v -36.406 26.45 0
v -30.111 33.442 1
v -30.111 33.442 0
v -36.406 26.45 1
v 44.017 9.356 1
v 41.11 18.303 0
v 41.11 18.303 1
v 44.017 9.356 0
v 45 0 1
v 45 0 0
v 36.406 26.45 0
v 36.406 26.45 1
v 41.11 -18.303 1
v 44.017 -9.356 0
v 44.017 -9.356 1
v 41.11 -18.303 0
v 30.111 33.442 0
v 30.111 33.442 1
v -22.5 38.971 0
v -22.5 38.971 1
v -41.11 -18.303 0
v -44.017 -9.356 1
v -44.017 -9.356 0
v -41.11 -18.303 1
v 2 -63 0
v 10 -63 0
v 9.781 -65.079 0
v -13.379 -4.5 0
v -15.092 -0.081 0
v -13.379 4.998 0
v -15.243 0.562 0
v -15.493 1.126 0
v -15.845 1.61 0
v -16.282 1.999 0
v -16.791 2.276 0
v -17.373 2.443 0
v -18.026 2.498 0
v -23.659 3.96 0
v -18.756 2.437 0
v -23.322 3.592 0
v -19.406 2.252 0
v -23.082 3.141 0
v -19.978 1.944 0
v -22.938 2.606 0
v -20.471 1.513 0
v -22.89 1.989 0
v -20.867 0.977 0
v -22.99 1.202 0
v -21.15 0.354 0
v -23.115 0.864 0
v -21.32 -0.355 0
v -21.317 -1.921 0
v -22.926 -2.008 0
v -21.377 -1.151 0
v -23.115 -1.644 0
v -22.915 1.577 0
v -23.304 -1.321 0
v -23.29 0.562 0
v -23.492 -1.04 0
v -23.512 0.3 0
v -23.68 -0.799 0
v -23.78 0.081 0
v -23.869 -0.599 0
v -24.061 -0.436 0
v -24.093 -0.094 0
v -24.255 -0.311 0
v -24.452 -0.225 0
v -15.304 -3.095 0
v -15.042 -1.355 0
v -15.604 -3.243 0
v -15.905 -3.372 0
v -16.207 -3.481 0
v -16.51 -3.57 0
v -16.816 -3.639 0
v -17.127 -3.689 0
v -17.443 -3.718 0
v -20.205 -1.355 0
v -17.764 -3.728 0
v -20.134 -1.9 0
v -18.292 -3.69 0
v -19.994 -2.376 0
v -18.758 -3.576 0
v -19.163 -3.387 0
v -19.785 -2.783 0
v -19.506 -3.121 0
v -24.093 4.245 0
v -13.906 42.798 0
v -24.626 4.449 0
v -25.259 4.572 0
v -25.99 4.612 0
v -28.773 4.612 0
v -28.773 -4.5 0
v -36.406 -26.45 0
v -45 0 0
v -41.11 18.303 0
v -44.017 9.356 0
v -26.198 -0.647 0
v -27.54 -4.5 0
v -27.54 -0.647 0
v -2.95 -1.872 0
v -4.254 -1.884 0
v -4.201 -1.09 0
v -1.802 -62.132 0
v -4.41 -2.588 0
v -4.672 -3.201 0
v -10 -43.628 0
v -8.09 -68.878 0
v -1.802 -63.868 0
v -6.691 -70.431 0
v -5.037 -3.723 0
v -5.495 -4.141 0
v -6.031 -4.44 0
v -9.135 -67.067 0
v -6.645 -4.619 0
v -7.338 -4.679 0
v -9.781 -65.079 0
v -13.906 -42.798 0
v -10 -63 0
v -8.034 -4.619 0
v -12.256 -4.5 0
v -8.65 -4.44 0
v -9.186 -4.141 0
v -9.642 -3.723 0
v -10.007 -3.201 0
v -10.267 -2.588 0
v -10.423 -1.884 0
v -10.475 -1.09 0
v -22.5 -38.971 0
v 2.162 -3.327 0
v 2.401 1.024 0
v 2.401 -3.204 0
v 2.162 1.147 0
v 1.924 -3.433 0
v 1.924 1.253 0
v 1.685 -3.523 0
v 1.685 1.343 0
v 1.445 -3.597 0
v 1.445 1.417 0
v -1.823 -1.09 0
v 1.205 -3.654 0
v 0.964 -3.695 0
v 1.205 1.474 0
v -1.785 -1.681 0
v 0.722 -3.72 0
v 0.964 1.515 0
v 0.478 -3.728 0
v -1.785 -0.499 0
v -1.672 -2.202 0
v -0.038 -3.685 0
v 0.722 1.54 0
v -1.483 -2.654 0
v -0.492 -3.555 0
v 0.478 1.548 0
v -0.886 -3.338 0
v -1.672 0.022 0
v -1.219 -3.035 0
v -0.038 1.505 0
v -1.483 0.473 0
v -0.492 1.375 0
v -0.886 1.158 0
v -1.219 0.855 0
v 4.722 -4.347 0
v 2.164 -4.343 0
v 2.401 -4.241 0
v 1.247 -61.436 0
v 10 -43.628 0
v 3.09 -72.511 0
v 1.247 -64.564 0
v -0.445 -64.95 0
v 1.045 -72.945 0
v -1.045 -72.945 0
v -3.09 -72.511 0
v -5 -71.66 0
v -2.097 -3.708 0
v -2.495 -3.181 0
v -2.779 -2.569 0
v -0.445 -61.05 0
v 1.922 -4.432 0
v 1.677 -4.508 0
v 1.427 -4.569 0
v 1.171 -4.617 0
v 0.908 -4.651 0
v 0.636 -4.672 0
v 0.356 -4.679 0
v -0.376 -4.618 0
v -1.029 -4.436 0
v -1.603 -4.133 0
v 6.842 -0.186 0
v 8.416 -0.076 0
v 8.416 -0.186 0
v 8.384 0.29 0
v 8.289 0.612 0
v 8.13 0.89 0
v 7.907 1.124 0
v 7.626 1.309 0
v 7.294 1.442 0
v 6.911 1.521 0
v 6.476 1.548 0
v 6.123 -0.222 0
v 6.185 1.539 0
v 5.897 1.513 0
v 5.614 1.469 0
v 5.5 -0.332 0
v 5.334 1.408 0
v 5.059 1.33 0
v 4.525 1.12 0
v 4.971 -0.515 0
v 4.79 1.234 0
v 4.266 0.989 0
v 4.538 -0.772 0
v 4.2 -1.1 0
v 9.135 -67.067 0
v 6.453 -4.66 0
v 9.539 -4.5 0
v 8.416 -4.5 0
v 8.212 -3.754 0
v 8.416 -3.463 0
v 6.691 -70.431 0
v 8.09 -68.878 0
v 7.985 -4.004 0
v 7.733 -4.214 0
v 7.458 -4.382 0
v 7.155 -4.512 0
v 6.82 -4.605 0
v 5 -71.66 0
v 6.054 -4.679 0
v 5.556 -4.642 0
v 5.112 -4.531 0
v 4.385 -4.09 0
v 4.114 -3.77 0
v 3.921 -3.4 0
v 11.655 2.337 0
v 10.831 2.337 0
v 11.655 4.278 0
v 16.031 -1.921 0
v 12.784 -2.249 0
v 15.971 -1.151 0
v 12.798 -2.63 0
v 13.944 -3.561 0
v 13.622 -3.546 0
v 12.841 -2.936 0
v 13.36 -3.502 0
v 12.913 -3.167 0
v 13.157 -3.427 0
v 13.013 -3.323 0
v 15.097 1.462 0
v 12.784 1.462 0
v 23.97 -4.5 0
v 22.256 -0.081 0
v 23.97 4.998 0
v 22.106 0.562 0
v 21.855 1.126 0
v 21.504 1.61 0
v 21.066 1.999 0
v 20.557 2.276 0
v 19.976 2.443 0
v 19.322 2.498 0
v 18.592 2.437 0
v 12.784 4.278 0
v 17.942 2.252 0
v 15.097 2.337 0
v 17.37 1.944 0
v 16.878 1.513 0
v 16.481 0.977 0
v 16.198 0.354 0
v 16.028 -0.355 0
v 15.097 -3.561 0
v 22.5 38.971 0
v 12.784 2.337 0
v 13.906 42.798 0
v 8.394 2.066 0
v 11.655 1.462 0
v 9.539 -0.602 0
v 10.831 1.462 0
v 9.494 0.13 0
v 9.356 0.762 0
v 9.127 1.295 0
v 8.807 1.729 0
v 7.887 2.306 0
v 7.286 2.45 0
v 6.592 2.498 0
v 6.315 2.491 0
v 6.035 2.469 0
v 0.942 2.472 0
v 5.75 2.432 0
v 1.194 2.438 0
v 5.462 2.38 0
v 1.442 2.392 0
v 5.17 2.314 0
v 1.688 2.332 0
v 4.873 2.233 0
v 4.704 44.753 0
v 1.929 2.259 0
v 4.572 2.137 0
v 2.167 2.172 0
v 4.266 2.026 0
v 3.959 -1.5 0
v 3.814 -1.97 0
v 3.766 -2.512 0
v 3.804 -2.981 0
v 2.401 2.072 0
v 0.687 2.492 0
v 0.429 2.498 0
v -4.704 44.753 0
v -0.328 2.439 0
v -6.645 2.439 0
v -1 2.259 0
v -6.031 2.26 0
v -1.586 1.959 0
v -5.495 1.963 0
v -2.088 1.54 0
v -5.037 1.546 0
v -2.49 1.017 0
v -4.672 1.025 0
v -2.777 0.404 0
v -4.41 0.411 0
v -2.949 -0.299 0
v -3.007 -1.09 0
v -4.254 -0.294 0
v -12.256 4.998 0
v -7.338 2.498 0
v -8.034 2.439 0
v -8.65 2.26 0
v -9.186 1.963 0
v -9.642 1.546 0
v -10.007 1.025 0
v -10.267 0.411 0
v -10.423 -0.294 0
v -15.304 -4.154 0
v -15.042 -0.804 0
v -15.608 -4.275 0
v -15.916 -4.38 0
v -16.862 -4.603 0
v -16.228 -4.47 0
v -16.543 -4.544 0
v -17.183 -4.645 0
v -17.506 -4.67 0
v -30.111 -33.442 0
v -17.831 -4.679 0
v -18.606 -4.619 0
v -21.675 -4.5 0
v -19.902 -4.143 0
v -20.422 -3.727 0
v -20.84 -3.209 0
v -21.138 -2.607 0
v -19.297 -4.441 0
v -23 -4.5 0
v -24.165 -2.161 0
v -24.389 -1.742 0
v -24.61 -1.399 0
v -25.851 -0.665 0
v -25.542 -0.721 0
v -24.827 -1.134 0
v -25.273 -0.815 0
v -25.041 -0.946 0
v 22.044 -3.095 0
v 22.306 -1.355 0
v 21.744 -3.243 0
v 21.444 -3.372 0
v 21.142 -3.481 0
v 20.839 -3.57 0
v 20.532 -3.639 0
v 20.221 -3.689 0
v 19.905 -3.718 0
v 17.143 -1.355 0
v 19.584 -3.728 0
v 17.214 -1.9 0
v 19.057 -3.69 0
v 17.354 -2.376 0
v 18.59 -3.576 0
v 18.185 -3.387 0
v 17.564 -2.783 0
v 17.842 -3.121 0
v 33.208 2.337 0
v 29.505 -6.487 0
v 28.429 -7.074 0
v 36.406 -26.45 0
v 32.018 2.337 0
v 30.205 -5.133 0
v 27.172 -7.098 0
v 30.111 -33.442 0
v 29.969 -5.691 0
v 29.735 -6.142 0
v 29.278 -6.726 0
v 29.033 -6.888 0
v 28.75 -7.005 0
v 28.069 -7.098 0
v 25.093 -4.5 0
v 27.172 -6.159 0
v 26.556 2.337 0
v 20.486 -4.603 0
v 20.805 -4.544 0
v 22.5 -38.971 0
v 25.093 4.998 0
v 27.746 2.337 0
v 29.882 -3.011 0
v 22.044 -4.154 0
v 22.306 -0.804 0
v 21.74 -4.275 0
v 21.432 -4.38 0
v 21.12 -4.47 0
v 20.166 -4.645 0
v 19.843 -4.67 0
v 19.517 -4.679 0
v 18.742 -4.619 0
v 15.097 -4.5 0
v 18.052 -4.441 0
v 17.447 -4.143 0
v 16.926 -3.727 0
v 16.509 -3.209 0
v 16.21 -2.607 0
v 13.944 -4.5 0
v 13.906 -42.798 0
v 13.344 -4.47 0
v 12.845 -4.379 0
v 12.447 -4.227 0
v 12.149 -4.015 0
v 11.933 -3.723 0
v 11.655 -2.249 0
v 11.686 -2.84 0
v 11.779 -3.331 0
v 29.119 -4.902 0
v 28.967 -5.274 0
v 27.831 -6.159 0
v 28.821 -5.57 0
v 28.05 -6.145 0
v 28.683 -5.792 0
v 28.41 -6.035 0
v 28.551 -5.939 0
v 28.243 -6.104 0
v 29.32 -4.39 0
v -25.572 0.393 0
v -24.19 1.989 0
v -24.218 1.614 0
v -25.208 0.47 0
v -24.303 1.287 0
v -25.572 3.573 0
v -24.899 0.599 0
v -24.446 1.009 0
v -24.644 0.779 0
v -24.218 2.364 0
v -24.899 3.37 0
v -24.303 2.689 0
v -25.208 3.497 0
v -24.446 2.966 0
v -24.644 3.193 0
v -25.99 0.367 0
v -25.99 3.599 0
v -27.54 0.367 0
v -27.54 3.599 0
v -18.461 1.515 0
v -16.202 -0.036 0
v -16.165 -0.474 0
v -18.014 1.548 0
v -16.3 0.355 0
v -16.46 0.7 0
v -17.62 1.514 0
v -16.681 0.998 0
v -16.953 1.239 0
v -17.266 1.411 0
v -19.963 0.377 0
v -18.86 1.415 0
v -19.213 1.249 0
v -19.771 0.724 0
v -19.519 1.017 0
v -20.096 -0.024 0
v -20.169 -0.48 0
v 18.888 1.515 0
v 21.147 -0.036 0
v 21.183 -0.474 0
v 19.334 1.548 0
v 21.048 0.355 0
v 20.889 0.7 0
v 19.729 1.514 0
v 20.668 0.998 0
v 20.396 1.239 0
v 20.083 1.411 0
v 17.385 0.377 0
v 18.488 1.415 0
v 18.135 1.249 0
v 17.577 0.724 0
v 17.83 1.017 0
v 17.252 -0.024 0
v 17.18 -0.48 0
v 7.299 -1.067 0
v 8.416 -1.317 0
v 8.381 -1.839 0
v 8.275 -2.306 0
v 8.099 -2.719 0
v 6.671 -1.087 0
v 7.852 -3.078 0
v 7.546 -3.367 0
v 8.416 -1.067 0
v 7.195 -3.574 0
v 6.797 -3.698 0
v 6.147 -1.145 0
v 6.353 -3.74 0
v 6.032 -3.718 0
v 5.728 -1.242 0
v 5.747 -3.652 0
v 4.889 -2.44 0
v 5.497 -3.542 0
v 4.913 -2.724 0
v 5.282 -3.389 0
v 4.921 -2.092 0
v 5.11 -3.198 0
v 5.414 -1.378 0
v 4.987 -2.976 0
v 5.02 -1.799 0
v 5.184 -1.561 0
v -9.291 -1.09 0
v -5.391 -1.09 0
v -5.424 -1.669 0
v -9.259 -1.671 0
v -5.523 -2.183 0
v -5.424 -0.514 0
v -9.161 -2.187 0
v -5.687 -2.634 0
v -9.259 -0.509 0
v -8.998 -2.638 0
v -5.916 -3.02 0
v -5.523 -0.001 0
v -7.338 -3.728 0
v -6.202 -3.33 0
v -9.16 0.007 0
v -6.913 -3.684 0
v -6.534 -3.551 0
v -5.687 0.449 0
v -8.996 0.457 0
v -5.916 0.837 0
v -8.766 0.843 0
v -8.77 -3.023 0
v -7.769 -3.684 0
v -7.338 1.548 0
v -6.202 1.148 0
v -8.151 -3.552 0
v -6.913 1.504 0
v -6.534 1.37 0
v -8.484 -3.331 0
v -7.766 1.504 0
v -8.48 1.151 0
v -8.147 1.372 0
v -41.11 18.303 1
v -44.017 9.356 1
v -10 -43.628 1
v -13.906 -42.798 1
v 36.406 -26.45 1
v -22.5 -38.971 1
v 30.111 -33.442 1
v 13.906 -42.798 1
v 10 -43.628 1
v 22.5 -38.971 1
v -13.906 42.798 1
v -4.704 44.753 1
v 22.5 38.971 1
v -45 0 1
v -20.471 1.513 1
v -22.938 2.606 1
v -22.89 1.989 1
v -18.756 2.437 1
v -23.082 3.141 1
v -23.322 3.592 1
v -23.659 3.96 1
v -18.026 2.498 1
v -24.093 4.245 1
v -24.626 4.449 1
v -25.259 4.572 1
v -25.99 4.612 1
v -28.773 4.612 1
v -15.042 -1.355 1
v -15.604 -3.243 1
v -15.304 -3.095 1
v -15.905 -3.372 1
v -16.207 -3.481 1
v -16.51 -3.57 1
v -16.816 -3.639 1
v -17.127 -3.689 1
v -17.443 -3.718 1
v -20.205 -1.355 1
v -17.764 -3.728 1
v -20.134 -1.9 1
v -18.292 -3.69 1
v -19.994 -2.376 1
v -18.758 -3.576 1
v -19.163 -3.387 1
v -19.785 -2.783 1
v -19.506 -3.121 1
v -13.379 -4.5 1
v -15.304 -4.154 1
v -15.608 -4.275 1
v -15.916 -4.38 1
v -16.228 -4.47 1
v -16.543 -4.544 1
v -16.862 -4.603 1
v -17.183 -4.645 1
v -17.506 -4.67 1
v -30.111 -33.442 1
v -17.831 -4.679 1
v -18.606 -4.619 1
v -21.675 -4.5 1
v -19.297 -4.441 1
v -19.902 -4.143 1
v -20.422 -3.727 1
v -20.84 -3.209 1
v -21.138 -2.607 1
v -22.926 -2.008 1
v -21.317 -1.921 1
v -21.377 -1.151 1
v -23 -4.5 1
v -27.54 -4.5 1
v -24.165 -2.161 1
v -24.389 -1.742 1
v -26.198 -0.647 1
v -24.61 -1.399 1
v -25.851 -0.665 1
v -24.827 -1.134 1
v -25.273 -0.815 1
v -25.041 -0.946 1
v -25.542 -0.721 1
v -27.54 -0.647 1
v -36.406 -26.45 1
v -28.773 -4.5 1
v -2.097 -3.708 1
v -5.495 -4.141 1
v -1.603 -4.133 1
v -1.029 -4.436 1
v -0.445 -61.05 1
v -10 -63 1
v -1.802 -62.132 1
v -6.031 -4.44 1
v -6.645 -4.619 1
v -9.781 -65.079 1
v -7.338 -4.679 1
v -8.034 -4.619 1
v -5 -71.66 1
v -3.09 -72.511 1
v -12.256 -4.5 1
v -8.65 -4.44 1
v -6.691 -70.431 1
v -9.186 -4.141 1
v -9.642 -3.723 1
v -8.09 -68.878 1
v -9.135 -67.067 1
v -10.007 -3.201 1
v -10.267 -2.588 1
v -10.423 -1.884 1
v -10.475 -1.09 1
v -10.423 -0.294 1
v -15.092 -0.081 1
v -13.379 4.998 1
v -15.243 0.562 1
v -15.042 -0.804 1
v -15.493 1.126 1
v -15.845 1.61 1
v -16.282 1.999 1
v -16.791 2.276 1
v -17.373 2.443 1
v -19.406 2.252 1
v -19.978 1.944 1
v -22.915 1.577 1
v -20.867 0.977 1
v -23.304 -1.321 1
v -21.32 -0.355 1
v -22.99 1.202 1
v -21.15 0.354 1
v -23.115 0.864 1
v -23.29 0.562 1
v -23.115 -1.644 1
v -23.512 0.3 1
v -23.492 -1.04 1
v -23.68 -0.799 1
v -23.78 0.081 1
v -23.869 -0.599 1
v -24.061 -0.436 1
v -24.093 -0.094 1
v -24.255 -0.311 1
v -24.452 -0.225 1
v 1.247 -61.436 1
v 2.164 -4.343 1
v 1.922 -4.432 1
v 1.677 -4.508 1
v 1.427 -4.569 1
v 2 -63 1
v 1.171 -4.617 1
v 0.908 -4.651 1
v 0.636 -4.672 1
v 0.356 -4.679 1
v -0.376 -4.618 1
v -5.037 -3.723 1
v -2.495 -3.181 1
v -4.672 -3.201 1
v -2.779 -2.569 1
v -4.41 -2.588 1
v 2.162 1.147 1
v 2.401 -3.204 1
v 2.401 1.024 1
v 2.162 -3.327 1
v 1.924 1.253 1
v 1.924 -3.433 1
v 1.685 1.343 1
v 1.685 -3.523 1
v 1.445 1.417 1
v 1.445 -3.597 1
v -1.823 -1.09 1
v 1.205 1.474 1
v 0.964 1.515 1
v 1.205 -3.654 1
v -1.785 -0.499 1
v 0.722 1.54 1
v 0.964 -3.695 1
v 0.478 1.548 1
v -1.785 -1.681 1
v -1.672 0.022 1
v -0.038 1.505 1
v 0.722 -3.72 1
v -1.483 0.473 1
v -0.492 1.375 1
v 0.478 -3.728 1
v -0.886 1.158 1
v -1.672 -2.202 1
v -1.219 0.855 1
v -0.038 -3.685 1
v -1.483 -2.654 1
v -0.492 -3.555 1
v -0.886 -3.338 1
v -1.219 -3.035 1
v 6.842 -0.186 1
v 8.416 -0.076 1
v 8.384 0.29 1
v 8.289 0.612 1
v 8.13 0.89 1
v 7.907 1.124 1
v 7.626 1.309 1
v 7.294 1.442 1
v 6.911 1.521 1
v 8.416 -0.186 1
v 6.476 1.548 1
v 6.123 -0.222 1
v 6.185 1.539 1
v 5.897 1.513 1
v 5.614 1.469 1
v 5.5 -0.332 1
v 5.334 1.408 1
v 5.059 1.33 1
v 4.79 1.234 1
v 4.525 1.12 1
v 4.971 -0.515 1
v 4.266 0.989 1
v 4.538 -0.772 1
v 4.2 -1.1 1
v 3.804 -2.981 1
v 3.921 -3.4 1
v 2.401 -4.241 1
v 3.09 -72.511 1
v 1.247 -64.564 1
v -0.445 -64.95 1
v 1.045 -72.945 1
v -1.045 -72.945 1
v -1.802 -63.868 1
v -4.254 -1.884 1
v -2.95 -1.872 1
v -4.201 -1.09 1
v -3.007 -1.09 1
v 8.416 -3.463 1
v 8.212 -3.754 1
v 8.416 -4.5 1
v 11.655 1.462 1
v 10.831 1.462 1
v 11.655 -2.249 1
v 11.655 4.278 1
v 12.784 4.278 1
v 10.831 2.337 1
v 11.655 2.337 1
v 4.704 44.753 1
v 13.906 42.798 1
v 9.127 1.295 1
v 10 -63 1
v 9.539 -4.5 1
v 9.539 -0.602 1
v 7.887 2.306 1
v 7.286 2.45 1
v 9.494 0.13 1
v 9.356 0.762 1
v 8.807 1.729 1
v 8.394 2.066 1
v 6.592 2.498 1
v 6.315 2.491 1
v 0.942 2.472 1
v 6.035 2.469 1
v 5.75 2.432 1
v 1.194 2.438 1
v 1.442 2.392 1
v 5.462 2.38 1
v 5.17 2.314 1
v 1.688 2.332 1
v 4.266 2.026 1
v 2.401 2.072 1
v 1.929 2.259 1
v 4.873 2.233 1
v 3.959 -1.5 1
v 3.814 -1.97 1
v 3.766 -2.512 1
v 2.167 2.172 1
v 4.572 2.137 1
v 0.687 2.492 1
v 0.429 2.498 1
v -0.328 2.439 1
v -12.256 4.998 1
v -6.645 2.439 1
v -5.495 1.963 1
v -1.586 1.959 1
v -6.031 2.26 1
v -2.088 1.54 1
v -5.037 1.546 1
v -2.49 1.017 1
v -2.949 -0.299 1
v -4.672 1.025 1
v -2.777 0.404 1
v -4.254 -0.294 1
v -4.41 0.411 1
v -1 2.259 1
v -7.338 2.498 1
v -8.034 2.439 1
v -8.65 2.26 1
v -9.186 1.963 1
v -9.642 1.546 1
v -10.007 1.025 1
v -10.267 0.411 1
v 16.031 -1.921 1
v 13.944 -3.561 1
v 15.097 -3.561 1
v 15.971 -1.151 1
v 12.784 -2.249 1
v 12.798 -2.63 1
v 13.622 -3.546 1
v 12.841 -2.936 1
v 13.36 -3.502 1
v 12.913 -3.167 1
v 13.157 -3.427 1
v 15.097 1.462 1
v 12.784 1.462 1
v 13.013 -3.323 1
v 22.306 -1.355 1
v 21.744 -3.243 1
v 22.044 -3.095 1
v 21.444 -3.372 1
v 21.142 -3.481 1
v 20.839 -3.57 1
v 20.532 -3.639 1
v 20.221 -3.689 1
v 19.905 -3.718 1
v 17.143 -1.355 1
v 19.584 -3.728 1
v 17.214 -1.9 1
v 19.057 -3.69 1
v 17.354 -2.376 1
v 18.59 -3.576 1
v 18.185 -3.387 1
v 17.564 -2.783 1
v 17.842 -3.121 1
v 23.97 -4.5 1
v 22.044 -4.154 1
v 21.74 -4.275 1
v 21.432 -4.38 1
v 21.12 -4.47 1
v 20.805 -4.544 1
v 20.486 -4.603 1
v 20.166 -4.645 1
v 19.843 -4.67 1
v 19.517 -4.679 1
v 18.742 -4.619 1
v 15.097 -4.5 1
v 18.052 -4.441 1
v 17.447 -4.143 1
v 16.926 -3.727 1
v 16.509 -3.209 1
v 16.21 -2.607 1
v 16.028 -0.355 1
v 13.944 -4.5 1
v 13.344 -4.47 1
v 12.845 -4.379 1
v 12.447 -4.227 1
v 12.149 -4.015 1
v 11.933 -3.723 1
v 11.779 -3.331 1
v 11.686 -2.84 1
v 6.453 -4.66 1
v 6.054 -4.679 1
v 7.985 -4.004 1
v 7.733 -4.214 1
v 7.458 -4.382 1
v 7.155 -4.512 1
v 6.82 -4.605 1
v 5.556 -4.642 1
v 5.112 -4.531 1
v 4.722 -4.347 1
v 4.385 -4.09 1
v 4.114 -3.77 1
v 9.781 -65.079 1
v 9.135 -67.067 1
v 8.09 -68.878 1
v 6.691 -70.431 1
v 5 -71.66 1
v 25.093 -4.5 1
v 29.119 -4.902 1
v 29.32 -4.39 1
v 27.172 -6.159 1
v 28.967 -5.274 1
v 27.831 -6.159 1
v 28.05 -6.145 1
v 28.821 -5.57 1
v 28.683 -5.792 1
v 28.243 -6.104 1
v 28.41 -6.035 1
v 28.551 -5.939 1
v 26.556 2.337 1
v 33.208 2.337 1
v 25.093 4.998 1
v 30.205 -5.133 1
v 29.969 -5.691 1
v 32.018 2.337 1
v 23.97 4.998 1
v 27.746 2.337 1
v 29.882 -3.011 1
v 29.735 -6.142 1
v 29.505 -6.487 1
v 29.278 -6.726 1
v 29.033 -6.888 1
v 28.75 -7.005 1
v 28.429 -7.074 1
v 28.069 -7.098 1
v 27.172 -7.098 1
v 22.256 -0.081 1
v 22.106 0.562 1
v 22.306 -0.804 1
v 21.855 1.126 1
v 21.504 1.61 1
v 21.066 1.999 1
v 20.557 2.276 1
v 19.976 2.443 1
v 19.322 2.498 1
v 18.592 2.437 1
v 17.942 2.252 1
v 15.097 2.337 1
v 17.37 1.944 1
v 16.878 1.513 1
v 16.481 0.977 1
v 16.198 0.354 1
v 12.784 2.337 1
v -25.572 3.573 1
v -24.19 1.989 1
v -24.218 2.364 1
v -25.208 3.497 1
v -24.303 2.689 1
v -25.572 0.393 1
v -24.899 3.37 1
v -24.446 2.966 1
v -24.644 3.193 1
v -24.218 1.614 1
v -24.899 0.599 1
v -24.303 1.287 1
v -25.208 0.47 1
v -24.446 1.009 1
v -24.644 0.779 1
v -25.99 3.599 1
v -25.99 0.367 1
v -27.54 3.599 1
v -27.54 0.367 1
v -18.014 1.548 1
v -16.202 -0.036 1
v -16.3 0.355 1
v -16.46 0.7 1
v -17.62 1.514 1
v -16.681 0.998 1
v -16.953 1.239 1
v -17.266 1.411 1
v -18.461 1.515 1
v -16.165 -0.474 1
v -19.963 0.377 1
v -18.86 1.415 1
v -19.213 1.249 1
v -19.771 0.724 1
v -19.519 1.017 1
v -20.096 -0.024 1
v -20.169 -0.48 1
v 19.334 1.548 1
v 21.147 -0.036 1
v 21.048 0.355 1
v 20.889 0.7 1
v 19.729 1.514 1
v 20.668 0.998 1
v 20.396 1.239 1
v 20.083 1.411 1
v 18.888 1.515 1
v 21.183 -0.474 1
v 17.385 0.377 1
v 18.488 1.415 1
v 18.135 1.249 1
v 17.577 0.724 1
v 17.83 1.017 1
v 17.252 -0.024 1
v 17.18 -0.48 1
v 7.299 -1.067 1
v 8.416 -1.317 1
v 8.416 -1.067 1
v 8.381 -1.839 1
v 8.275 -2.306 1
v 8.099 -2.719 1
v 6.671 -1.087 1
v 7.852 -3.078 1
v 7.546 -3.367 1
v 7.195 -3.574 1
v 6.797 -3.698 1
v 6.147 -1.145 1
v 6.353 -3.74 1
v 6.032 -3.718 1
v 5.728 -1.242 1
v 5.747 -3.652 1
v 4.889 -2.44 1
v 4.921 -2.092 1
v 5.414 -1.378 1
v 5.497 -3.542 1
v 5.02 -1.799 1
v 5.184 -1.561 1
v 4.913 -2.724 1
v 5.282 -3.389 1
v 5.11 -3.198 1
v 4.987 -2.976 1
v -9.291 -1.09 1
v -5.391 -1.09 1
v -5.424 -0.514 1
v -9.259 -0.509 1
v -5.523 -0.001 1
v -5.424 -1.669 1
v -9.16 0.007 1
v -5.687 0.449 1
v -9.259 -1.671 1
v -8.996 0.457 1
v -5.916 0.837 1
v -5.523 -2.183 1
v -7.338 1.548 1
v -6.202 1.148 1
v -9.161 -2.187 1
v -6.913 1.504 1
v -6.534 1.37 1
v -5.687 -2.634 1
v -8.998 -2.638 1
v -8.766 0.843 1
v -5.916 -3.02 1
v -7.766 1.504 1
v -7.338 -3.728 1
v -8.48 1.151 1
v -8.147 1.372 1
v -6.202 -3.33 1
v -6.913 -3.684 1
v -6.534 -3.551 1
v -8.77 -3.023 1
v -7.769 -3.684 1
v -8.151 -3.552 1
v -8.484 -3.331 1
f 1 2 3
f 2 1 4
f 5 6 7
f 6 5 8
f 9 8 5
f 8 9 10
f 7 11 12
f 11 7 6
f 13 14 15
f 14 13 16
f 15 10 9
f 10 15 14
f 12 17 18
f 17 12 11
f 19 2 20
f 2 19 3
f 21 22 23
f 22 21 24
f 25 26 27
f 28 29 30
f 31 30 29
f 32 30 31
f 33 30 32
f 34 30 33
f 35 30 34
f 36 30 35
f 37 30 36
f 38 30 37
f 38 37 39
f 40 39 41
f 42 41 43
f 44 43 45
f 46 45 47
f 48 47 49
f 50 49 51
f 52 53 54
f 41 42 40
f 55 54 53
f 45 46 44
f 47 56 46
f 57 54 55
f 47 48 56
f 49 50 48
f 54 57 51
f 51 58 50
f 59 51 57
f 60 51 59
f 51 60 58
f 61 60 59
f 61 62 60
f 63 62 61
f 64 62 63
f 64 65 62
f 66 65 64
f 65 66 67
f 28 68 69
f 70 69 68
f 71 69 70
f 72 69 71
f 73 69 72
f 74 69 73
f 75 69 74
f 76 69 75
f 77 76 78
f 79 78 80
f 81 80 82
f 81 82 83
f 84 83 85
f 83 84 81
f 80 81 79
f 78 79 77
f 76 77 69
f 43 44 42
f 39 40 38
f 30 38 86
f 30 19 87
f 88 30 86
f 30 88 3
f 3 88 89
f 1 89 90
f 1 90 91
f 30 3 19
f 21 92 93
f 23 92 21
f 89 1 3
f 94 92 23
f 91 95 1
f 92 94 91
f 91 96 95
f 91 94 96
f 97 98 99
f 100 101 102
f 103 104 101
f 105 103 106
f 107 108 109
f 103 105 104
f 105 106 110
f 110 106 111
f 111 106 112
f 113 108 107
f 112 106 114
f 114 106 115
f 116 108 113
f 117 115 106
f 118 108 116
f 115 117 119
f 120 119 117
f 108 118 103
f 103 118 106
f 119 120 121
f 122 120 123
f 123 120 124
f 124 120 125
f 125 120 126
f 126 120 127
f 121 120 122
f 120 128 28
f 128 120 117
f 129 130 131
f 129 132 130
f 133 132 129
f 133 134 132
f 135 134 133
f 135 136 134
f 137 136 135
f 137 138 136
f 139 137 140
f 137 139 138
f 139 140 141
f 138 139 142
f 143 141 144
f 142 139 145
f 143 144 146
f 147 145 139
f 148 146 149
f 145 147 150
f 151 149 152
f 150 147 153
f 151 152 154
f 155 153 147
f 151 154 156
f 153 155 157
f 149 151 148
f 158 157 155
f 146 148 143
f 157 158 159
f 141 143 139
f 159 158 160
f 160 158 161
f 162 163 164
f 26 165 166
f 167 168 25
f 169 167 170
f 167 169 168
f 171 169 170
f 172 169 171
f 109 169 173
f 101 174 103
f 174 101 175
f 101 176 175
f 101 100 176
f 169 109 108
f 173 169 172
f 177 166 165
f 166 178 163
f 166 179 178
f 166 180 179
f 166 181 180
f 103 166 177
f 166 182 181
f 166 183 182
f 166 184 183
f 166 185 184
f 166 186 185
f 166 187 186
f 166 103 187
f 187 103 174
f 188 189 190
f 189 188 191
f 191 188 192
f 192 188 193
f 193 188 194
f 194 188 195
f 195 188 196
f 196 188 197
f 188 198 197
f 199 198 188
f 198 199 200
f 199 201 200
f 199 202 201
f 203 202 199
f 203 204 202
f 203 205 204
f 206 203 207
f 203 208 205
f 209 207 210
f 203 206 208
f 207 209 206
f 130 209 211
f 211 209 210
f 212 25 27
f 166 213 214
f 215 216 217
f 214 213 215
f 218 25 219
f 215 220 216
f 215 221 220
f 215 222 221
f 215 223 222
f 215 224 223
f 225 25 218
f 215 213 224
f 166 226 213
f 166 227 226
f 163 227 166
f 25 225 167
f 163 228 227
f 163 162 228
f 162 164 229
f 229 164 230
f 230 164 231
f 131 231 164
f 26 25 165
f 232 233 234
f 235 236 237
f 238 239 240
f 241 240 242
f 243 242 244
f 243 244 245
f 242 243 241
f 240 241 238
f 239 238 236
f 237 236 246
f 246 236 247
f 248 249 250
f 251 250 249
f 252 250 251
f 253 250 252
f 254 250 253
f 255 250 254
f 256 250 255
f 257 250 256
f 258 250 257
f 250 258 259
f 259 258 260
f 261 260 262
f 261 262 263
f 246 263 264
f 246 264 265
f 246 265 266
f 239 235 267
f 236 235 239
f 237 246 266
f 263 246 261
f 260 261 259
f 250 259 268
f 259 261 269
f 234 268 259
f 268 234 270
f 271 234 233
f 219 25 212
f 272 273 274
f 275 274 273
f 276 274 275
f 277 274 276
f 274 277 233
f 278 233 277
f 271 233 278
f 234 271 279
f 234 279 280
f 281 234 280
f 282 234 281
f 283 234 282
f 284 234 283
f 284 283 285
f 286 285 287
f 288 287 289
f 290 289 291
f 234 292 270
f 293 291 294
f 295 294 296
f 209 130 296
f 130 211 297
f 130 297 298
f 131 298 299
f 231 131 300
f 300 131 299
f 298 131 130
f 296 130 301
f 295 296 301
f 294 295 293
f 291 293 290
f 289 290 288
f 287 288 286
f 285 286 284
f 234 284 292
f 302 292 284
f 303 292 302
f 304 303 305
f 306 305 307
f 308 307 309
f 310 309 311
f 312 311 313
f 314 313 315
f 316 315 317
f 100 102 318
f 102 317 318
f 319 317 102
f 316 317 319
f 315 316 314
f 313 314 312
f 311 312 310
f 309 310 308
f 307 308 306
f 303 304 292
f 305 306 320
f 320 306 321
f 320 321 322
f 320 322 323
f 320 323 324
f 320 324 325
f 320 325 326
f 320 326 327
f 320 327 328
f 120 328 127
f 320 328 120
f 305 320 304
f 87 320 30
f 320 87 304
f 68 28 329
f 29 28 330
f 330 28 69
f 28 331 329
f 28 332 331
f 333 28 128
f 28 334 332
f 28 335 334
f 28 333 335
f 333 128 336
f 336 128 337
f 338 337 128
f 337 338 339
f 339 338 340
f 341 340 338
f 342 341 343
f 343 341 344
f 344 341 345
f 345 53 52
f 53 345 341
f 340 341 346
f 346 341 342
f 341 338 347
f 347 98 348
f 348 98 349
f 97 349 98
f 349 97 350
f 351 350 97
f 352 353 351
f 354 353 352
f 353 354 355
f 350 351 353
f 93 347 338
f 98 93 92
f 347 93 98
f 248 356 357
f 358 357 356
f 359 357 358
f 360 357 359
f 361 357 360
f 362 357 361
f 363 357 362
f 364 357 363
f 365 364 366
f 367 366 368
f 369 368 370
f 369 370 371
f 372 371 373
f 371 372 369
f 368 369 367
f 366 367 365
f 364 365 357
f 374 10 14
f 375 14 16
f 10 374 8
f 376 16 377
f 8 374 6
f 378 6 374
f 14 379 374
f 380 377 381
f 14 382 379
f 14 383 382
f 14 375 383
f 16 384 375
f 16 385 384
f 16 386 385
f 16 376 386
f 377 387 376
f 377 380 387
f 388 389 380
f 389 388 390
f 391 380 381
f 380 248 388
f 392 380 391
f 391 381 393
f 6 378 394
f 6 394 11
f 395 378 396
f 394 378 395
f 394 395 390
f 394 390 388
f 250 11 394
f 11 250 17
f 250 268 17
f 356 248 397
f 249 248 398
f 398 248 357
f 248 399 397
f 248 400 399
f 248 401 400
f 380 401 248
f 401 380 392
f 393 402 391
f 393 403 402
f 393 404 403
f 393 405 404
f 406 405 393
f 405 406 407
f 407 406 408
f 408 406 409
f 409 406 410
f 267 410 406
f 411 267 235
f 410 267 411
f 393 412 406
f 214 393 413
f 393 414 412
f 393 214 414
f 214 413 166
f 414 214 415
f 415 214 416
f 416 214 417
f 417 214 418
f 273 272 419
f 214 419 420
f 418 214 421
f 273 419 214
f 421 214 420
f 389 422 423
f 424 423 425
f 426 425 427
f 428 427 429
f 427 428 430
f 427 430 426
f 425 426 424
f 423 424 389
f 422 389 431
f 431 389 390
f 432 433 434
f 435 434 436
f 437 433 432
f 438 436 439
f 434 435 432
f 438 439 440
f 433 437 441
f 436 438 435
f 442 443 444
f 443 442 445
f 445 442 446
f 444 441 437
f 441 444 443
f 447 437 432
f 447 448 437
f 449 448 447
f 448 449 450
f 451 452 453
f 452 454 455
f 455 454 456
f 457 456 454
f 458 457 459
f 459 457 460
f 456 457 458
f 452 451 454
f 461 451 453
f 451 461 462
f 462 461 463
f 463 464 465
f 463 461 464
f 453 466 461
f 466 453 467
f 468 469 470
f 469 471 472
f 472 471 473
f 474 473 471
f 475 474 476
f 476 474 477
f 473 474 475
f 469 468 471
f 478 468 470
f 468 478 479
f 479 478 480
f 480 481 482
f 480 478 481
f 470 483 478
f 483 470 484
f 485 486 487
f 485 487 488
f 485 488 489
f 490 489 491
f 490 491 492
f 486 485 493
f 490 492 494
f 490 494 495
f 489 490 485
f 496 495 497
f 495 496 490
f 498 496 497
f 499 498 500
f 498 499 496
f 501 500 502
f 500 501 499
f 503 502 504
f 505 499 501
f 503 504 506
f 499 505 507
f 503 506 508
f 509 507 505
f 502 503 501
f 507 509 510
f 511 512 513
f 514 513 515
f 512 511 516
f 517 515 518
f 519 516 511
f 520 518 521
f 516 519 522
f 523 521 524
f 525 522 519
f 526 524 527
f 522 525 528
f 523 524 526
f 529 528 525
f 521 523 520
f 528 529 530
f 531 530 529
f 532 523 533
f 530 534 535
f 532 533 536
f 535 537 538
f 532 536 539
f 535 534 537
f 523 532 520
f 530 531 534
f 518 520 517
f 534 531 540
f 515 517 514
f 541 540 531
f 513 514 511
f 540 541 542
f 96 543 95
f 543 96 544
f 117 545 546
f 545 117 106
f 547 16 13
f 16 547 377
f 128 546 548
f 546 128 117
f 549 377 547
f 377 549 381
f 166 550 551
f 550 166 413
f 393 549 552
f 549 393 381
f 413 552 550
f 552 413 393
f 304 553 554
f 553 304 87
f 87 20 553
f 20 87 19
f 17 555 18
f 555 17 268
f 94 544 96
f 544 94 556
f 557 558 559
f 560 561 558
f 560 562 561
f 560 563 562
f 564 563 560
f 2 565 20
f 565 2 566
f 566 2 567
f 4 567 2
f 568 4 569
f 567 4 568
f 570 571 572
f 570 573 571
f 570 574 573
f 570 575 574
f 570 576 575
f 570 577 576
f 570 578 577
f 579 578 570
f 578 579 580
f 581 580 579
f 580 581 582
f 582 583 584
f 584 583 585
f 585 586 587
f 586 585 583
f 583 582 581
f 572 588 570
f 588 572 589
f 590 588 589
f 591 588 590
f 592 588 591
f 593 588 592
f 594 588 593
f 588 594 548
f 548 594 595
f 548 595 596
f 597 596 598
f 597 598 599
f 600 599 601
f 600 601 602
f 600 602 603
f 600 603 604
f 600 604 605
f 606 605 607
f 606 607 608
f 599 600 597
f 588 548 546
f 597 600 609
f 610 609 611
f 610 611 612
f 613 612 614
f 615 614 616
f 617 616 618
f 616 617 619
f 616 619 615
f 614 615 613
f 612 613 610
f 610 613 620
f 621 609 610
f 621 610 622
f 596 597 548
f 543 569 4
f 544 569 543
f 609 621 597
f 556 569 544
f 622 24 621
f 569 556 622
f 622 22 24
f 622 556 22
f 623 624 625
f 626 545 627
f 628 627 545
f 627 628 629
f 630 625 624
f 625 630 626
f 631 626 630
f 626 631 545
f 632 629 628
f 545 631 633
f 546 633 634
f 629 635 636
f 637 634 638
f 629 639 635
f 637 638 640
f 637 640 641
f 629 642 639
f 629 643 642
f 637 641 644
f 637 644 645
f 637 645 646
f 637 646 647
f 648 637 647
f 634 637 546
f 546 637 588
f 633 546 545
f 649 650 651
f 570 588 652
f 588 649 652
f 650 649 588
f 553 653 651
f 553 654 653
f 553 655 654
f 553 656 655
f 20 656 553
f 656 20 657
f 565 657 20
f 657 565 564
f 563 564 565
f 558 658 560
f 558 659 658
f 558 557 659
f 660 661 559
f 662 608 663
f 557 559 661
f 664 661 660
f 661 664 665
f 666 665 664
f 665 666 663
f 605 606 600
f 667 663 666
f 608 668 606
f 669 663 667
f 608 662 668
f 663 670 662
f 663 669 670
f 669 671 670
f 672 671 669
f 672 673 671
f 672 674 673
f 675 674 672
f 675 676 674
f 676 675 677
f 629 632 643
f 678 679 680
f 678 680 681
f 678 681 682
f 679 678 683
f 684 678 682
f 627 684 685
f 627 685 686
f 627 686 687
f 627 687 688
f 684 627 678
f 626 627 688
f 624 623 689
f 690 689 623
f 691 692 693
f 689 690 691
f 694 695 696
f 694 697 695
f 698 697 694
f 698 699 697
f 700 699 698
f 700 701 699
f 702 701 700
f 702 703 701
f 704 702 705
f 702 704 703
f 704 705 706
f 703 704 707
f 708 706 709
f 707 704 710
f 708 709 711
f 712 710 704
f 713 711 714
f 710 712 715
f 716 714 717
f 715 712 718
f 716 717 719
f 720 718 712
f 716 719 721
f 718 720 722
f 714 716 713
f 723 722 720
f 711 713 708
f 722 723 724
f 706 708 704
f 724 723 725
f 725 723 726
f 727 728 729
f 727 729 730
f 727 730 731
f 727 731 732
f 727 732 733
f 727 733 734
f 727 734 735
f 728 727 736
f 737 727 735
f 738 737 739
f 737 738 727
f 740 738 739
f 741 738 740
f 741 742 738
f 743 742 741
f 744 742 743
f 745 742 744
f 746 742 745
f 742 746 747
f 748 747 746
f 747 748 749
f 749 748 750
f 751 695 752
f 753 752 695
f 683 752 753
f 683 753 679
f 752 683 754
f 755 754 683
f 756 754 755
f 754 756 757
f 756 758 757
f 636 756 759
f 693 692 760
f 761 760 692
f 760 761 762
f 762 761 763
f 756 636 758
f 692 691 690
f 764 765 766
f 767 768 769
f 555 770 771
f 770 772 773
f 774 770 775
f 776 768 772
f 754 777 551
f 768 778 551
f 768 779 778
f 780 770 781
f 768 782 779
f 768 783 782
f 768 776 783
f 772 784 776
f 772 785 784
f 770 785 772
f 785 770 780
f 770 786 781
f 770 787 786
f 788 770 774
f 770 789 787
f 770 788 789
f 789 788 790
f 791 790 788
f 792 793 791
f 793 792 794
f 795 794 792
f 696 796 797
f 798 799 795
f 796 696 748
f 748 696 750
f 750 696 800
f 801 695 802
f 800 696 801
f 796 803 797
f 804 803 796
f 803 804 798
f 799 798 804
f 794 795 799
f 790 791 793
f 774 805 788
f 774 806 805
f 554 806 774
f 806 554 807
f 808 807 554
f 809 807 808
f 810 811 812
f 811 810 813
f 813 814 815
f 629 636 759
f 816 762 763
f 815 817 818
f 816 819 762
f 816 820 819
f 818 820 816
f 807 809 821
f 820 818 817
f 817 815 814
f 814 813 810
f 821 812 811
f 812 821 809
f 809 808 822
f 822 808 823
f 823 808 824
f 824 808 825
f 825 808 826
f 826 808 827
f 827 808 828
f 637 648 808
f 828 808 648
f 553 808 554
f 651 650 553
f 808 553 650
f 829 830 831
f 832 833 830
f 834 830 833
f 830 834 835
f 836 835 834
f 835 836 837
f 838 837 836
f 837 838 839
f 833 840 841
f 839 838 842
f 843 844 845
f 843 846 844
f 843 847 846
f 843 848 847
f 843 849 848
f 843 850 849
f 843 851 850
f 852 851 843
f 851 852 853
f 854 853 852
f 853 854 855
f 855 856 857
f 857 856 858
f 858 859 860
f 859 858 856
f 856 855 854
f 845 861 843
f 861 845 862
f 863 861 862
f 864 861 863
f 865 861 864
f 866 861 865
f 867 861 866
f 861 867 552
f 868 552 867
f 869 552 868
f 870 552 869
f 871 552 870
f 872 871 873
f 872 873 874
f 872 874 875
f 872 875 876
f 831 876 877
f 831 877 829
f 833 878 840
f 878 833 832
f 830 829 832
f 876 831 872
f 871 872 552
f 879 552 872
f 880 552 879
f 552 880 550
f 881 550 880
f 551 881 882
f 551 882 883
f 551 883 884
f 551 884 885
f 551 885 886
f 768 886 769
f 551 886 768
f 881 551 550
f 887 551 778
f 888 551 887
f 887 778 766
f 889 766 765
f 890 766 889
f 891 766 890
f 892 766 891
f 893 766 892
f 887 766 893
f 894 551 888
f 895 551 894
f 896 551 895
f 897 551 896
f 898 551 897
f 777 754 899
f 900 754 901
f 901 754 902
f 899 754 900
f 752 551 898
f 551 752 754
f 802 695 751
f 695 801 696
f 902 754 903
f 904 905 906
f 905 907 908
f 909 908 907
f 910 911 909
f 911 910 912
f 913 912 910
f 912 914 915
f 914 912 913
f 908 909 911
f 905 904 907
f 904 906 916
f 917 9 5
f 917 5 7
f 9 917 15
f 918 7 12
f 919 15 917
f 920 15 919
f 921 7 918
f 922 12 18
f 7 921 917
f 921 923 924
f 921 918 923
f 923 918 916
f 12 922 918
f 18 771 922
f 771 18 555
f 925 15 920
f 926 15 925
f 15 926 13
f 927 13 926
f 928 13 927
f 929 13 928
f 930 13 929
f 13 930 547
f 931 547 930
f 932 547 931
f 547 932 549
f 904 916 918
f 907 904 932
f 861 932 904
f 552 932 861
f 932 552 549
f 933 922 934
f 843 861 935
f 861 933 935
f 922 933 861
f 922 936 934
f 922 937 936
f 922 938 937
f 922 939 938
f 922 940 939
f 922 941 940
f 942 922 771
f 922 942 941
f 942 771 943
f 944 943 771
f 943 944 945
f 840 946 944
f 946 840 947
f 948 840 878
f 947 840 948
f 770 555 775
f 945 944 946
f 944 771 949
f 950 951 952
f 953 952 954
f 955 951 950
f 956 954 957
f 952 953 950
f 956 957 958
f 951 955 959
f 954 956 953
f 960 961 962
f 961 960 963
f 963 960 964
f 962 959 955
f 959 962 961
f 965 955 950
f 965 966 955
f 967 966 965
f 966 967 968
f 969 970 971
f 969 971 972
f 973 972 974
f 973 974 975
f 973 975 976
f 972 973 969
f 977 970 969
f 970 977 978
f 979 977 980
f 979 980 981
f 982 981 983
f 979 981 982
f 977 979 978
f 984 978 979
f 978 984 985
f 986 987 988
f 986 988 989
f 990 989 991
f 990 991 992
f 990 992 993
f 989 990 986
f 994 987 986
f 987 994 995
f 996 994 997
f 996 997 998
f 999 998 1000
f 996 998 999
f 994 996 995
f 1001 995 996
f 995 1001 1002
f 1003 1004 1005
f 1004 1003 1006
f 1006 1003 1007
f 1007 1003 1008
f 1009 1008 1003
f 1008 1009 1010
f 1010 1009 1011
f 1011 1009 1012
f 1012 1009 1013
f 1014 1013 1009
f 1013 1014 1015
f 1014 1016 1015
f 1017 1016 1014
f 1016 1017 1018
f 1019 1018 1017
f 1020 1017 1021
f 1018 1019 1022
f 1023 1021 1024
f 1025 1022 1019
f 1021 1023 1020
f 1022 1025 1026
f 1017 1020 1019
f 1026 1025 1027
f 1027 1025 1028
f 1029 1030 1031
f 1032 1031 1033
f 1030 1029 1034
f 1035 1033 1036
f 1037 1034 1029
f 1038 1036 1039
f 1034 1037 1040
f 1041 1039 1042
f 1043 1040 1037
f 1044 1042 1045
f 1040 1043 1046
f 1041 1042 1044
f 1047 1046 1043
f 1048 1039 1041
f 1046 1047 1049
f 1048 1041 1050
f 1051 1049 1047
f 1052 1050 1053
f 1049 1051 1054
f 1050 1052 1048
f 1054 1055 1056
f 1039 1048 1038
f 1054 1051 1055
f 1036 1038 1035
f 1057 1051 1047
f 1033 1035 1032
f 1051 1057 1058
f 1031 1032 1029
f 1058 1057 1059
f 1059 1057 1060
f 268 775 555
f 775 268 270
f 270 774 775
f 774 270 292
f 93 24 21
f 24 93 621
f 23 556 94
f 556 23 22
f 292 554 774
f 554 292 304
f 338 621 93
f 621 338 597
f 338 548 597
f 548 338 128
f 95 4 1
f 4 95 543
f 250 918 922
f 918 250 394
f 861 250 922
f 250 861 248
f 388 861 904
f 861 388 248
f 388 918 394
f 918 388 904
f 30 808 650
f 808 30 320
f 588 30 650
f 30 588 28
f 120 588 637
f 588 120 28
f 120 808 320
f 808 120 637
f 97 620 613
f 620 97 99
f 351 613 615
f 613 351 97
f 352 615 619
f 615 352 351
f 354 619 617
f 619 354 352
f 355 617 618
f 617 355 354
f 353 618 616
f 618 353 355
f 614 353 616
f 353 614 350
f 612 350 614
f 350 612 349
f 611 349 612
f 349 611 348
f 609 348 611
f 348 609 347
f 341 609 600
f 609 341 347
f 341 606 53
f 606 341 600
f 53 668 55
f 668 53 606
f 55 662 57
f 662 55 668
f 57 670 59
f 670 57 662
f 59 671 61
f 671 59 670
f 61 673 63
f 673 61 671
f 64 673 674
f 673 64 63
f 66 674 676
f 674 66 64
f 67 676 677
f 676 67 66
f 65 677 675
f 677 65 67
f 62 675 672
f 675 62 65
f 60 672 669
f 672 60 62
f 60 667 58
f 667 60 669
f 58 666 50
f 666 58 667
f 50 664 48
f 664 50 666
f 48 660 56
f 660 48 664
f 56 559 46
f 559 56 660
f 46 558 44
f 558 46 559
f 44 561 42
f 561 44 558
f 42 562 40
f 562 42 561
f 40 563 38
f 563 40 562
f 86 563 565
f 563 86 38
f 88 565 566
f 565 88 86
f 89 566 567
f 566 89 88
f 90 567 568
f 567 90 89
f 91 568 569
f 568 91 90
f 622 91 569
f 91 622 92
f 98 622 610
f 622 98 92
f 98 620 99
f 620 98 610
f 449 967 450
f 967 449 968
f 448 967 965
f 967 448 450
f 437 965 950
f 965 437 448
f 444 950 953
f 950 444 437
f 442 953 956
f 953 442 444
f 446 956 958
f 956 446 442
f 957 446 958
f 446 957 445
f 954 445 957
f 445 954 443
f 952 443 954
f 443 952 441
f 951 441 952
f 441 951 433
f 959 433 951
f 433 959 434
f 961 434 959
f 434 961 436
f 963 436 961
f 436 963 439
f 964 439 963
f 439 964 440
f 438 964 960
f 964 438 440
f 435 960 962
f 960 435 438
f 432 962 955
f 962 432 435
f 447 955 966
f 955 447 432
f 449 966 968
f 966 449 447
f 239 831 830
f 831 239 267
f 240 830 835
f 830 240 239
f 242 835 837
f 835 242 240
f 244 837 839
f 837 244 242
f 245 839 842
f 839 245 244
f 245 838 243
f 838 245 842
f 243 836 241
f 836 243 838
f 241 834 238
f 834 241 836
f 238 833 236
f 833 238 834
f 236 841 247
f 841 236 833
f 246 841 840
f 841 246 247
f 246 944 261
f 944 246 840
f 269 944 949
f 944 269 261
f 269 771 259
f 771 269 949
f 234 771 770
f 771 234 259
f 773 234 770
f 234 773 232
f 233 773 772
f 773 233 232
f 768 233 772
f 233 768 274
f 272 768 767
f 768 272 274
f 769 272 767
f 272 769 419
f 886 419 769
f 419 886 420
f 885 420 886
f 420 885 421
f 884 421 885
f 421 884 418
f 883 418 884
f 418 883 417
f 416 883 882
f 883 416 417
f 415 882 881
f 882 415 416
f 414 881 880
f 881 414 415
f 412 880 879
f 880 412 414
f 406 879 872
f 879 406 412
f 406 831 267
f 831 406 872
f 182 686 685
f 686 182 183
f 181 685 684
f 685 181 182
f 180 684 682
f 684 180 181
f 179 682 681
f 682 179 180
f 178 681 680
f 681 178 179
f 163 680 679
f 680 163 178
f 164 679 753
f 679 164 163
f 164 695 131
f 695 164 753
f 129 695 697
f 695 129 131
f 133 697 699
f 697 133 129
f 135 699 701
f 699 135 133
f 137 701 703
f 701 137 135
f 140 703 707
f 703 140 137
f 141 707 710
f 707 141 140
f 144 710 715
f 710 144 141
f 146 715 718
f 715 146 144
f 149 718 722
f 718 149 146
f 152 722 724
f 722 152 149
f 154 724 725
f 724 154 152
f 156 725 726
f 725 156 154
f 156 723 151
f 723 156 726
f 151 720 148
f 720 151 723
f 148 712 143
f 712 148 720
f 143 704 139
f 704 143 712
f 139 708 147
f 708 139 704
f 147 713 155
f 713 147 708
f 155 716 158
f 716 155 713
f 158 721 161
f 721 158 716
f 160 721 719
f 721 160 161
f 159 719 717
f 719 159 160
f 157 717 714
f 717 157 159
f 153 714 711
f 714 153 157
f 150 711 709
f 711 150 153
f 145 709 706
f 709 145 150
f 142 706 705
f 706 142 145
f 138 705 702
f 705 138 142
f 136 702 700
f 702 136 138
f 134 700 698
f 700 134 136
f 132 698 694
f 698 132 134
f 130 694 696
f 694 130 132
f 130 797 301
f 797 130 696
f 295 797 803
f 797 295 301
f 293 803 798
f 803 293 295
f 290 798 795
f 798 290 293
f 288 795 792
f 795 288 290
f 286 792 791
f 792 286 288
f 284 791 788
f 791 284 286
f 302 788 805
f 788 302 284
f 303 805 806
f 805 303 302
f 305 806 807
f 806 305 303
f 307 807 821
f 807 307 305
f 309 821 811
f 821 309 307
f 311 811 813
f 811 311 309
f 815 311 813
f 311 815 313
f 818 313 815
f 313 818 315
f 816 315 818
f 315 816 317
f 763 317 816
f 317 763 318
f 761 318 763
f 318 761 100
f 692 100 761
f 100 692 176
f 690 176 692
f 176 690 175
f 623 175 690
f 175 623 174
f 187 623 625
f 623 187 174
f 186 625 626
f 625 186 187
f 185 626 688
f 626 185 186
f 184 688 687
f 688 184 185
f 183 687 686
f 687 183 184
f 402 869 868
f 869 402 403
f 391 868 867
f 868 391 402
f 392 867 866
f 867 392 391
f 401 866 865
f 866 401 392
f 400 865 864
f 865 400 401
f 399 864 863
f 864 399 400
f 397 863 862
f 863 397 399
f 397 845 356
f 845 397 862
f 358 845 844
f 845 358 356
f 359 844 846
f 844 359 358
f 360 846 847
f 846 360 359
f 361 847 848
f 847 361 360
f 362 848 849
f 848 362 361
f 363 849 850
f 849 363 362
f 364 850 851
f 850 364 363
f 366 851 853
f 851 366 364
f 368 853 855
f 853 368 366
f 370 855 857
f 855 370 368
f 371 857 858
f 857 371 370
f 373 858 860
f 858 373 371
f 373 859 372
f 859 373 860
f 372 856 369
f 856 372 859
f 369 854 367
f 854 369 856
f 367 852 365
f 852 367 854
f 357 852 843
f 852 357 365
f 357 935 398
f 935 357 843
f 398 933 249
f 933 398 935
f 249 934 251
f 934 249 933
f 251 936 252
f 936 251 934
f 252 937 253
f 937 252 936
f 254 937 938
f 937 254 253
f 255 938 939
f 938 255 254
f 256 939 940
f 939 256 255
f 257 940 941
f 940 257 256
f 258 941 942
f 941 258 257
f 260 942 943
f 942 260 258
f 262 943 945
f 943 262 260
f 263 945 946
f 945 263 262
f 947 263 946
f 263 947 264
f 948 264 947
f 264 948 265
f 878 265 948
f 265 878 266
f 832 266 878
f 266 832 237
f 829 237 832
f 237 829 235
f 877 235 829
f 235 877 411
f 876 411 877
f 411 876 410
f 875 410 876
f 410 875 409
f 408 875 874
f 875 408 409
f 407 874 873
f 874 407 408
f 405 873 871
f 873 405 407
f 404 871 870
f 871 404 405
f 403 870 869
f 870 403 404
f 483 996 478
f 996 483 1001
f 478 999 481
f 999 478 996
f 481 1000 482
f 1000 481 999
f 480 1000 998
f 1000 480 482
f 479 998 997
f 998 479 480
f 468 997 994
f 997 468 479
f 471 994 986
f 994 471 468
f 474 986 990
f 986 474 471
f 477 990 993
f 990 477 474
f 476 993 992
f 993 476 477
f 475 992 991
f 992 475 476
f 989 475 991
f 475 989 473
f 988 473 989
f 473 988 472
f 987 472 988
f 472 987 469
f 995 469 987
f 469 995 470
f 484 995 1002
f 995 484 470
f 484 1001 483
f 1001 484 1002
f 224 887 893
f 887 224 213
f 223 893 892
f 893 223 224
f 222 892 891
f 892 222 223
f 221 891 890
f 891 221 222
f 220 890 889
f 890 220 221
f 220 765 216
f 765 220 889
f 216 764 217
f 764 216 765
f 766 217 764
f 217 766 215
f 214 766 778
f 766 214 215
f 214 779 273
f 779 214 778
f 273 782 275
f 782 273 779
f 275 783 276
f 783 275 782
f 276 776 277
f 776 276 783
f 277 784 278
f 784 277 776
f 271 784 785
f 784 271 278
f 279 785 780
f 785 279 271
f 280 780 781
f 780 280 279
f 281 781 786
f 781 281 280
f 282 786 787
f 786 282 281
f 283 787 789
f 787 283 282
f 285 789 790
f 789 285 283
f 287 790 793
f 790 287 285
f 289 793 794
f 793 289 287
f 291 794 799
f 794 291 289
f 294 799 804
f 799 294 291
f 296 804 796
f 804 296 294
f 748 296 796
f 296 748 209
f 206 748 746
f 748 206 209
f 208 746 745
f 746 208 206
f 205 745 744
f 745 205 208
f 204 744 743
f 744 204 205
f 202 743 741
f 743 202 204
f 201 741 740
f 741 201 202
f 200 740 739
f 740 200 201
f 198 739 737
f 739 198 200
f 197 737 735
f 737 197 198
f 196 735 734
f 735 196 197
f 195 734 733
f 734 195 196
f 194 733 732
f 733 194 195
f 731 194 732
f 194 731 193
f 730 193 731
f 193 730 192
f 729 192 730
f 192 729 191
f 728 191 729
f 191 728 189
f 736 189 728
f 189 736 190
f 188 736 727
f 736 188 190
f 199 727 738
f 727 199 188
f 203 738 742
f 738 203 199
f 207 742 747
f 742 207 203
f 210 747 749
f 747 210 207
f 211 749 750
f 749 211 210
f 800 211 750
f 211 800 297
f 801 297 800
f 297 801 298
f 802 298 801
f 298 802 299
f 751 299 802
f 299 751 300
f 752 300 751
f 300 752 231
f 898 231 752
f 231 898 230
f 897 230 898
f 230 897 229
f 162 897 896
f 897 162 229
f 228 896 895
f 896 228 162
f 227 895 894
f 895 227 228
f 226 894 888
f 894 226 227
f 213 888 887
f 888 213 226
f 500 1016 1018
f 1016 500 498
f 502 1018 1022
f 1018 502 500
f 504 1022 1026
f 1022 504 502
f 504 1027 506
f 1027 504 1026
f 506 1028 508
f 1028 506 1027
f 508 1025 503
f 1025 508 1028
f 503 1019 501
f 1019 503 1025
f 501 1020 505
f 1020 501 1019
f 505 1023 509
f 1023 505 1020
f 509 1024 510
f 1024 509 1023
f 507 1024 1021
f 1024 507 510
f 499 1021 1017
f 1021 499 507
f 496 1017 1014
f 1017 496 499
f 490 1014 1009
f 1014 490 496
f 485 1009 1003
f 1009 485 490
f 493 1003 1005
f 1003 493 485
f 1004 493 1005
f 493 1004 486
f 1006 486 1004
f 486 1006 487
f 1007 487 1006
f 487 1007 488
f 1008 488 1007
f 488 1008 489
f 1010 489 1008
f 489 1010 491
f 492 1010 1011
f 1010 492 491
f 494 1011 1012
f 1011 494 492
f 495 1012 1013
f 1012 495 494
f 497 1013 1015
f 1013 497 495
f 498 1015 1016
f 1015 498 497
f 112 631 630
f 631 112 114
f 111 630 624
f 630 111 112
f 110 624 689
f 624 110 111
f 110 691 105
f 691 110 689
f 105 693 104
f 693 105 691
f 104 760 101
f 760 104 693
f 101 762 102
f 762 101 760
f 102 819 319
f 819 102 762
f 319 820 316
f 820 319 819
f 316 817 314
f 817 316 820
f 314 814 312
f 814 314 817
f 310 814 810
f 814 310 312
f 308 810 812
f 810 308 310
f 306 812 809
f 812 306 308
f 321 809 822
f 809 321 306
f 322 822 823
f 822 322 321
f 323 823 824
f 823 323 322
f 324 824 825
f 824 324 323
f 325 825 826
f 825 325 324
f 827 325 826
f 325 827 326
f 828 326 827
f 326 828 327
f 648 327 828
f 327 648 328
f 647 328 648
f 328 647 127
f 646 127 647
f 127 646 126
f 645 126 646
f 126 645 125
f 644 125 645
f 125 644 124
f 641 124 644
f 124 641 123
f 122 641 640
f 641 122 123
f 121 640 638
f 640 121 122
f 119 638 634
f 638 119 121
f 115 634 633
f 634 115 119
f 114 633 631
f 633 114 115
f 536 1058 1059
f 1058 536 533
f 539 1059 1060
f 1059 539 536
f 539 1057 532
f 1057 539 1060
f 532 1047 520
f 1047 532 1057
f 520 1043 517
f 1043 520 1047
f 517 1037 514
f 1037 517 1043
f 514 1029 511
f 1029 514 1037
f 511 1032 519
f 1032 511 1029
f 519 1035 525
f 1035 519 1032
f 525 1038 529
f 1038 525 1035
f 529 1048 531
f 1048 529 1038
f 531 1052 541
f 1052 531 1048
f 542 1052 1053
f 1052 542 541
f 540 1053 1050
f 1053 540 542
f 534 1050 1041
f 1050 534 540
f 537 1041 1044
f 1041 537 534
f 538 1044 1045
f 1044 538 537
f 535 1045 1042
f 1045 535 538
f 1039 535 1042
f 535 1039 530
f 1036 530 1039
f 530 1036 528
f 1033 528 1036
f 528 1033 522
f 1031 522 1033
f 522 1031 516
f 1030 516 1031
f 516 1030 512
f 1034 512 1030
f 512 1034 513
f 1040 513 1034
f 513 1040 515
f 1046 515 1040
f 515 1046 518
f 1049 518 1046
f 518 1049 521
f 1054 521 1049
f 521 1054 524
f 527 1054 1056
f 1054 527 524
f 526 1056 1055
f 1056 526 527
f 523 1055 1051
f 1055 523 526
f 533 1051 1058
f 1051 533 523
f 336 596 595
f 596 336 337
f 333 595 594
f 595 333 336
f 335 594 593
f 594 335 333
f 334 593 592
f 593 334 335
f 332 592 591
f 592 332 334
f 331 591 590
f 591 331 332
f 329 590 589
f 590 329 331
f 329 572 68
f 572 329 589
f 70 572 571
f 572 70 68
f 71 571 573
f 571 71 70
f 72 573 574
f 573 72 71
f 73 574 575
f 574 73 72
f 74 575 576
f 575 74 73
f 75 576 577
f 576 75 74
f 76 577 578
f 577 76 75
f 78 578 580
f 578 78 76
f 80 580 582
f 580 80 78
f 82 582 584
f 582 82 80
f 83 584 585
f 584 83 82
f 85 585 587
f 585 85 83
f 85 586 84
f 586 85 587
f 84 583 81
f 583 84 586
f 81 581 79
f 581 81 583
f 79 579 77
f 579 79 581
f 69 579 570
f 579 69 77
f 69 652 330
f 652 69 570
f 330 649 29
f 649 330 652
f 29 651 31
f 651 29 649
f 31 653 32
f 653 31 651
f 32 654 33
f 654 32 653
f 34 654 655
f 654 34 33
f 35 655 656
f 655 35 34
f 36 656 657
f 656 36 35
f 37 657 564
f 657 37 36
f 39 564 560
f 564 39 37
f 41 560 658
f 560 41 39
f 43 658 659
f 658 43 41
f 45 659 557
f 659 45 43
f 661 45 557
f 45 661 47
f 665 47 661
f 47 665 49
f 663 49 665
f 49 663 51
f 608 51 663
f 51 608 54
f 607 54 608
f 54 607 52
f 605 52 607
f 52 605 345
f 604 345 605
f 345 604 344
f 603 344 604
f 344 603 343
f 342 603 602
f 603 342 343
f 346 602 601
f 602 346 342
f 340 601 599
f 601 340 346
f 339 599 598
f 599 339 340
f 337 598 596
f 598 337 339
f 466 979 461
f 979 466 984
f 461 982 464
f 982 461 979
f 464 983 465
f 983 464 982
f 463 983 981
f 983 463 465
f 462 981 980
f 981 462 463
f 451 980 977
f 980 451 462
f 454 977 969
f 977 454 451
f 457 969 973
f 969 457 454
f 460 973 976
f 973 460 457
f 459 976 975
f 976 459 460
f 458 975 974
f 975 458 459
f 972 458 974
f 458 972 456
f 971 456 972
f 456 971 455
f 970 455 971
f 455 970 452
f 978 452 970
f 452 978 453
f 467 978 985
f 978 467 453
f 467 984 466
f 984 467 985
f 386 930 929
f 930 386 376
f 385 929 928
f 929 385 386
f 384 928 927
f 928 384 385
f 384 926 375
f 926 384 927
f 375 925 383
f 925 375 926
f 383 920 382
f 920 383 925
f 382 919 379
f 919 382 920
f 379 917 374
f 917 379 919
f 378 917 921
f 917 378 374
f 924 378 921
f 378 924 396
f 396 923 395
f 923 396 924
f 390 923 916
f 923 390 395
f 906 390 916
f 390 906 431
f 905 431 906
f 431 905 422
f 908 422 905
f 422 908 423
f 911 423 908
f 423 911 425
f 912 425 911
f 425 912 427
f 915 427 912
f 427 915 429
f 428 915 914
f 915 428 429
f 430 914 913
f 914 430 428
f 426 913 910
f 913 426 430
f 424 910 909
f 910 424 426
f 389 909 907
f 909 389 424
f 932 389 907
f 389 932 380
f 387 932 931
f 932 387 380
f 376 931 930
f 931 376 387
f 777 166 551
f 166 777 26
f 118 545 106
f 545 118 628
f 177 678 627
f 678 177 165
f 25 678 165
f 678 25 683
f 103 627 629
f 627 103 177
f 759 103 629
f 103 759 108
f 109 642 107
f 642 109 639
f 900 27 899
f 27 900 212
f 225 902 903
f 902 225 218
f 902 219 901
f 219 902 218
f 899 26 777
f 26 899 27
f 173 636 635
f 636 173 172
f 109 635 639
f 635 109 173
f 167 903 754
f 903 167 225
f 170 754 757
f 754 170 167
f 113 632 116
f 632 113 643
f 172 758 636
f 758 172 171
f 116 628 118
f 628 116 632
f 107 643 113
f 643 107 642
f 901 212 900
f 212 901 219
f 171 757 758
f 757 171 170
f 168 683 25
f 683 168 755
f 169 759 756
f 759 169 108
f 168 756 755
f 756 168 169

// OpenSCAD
difference() {
 cylinder(1, r=45);
 translate([-30, -4.5, 0]) linear_extrude(1) text("Relocately", size=9, font="CutOutsFLF:style=Regular");
}

difference() {
translate([-10, -63, 0]) cube([20,  20, 1]);
translate([0, -63, 0]) cylinder(1, r=2);
}

difference() {
translate([0, -63, 0]) cylinder(1, r=10);
translate([0, -63, 0]) cylinder(1, r=2);
}
